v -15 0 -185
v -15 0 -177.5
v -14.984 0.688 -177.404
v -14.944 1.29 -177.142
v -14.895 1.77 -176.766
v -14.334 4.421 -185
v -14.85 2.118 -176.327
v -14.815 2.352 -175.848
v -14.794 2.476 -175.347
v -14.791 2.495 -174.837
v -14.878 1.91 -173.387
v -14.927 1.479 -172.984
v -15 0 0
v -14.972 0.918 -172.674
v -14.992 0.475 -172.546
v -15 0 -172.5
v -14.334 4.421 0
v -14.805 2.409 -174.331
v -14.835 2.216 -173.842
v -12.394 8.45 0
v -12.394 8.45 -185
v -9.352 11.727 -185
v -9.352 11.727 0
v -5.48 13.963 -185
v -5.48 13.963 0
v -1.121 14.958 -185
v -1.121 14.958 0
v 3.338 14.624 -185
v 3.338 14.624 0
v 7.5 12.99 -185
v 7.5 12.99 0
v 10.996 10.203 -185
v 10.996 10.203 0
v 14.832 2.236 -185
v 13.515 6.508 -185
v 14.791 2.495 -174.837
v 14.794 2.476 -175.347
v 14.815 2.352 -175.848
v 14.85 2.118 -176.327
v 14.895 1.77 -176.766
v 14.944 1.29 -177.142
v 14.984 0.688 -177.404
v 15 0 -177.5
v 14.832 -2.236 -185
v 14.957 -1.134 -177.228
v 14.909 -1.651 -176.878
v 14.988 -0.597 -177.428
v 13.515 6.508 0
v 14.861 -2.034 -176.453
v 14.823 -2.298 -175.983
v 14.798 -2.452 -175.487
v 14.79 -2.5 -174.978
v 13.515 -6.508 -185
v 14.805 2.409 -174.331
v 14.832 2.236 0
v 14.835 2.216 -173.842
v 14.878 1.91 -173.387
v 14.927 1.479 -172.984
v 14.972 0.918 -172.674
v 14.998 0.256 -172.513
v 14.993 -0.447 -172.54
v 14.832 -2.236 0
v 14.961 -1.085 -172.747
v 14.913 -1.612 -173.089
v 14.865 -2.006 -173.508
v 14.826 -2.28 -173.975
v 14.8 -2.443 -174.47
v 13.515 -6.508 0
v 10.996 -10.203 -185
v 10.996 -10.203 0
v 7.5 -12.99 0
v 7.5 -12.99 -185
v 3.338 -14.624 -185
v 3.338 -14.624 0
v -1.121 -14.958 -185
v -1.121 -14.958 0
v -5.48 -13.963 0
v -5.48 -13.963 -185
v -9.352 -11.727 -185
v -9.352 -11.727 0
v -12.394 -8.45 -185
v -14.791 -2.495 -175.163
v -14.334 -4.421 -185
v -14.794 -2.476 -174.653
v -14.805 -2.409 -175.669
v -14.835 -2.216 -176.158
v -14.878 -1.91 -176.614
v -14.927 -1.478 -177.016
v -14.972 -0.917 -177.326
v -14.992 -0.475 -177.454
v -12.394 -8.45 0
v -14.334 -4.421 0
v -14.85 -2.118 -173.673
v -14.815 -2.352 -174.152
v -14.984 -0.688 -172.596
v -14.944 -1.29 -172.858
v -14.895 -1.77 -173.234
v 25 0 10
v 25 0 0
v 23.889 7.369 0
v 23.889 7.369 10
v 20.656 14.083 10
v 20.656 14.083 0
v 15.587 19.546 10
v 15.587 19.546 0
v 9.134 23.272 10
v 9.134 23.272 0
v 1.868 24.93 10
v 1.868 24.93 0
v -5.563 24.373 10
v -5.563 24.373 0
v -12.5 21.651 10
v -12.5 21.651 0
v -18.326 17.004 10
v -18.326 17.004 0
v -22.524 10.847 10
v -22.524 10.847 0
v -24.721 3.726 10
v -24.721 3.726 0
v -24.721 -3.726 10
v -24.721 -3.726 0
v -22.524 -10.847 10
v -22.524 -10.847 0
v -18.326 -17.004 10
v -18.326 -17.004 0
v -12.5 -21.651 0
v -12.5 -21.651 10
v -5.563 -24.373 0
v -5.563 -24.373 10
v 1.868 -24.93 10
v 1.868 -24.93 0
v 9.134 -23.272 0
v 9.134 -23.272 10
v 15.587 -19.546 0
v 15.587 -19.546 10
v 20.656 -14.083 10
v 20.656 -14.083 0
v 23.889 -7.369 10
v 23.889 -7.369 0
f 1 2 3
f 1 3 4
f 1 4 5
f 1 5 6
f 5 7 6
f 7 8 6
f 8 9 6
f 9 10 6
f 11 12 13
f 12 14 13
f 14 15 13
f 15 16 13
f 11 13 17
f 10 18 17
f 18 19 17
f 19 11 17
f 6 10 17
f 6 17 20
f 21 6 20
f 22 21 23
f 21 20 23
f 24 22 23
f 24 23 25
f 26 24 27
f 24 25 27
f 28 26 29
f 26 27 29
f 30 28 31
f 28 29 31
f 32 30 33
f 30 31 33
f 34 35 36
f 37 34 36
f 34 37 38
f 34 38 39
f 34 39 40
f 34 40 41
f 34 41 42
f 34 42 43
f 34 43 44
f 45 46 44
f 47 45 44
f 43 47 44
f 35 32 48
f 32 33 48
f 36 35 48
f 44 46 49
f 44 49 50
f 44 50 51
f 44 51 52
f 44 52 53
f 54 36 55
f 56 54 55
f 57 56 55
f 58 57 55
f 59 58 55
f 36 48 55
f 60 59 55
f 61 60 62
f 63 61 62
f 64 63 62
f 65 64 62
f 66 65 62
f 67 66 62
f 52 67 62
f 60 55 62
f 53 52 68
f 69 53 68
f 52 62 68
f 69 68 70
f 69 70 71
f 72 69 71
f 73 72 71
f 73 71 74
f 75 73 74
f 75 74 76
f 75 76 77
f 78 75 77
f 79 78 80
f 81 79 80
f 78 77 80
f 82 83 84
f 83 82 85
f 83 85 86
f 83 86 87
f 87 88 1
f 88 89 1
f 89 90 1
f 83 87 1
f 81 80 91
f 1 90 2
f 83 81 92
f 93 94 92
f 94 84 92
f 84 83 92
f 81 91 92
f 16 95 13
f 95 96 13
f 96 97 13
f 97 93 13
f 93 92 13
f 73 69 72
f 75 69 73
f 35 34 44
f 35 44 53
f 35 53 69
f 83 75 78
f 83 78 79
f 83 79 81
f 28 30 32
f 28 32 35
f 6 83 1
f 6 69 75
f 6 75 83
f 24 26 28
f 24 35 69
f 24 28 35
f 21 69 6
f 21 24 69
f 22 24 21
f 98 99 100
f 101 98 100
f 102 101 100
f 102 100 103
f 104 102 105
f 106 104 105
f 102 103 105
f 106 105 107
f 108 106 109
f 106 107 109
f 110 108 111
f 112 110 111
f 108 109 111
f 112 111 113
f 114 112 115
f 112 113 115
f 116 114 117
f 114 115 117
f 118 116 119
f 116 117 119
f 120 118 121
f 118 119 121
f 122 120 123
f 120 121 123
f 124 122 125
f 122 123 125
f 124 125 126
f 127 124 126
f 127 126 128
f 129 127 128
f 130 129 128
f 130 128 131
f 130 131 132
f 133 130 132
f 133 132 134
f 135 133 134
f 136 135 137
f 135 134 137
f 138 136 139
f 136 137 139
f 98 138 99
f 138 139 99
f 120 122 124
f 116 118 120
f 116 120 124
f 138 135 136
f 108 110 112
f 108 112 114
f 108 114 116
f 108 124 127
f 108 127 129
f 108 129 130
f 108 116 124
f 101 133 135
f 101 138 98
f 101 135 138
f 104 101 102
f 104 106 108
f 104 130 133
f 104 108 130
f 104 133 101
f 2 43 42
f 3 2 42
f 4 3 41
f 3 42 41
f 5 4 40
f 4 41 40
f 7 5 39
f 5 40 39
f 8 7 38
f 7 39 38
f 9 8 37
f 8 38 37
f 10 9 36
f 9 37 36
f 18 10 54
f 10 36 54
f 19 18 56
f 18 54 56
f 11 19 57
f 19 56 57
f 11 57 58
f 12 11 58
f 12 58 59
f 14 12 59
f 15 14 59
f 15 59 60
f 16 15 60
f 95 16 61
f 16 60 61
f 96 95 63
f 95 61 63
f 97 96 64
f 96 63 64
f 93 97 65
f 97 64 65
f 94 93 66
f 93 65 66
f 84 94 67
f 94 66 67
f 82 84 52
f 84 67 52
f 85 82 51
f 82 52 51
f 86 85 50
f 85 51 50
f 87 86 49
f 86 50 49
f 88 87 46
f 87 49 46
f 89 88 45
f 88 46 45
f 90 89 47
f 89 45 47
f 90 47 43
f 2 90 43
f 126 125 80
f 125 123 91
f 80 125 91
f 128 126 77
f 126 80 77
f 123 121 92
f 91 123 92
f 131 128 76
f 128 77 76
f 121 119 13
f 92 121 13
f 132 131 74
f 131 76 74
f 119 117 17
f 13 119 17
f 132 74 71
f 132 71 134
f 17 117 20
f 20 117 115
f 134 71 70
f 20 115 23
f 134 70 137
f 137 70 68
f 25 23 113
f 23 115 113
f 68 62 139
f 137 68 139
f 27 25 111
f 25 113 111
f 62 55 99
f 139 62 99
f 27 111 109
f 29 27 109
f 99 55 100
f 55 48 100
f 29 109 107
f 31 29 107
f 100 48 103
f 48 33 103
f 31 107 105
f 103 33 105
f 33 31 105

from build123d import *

# Parameters (mm, degrees)
SKETCH1_R           = 25
BOSS_EXTRUDE1_DEPTH = 10
SKETCH5_R           = 15
BOSS_EXTRUDE3_DEPTH = 185
SKETCH6_R           = 2.5
CUT_EXTRUDE1_DEPTH  = 92.5


with BuildPart() as part:
    # Sketch1 → Boss-Extrude1 (new body)
    with BuildSketch(Plane.XY):
        Circle(SKETCH1_R)
    extrude(amount=BOSS_EXTRUDE1_DEPTH)

    # Sketch5 → Boss-Extrude3 (add)
    with BuildSketch(Plane(origin=(0, 0, 0), x_dir=(-1, 0, 0), z_dir=(0, 0, -1))):
        Circle(SKETCH5_R)
    extrude(amount=BOSS_EXTRUDE3_DEPTH)

    # Sketch6 → Cut-Extrude1 (cut, symmetric)
    with BuildSketch(Plane(origin=(0, 0, 0), x_dir=(0, 0, -1), z_dir=(1, 0, 0))):
        with Locations((175, 0)):
            Circle(SKETCH6_R)
    extrude(amount=CUT_EXTRUDE1_DEPTH, both=True, mode=Mode.SUBTRACT)


solid = part.part
